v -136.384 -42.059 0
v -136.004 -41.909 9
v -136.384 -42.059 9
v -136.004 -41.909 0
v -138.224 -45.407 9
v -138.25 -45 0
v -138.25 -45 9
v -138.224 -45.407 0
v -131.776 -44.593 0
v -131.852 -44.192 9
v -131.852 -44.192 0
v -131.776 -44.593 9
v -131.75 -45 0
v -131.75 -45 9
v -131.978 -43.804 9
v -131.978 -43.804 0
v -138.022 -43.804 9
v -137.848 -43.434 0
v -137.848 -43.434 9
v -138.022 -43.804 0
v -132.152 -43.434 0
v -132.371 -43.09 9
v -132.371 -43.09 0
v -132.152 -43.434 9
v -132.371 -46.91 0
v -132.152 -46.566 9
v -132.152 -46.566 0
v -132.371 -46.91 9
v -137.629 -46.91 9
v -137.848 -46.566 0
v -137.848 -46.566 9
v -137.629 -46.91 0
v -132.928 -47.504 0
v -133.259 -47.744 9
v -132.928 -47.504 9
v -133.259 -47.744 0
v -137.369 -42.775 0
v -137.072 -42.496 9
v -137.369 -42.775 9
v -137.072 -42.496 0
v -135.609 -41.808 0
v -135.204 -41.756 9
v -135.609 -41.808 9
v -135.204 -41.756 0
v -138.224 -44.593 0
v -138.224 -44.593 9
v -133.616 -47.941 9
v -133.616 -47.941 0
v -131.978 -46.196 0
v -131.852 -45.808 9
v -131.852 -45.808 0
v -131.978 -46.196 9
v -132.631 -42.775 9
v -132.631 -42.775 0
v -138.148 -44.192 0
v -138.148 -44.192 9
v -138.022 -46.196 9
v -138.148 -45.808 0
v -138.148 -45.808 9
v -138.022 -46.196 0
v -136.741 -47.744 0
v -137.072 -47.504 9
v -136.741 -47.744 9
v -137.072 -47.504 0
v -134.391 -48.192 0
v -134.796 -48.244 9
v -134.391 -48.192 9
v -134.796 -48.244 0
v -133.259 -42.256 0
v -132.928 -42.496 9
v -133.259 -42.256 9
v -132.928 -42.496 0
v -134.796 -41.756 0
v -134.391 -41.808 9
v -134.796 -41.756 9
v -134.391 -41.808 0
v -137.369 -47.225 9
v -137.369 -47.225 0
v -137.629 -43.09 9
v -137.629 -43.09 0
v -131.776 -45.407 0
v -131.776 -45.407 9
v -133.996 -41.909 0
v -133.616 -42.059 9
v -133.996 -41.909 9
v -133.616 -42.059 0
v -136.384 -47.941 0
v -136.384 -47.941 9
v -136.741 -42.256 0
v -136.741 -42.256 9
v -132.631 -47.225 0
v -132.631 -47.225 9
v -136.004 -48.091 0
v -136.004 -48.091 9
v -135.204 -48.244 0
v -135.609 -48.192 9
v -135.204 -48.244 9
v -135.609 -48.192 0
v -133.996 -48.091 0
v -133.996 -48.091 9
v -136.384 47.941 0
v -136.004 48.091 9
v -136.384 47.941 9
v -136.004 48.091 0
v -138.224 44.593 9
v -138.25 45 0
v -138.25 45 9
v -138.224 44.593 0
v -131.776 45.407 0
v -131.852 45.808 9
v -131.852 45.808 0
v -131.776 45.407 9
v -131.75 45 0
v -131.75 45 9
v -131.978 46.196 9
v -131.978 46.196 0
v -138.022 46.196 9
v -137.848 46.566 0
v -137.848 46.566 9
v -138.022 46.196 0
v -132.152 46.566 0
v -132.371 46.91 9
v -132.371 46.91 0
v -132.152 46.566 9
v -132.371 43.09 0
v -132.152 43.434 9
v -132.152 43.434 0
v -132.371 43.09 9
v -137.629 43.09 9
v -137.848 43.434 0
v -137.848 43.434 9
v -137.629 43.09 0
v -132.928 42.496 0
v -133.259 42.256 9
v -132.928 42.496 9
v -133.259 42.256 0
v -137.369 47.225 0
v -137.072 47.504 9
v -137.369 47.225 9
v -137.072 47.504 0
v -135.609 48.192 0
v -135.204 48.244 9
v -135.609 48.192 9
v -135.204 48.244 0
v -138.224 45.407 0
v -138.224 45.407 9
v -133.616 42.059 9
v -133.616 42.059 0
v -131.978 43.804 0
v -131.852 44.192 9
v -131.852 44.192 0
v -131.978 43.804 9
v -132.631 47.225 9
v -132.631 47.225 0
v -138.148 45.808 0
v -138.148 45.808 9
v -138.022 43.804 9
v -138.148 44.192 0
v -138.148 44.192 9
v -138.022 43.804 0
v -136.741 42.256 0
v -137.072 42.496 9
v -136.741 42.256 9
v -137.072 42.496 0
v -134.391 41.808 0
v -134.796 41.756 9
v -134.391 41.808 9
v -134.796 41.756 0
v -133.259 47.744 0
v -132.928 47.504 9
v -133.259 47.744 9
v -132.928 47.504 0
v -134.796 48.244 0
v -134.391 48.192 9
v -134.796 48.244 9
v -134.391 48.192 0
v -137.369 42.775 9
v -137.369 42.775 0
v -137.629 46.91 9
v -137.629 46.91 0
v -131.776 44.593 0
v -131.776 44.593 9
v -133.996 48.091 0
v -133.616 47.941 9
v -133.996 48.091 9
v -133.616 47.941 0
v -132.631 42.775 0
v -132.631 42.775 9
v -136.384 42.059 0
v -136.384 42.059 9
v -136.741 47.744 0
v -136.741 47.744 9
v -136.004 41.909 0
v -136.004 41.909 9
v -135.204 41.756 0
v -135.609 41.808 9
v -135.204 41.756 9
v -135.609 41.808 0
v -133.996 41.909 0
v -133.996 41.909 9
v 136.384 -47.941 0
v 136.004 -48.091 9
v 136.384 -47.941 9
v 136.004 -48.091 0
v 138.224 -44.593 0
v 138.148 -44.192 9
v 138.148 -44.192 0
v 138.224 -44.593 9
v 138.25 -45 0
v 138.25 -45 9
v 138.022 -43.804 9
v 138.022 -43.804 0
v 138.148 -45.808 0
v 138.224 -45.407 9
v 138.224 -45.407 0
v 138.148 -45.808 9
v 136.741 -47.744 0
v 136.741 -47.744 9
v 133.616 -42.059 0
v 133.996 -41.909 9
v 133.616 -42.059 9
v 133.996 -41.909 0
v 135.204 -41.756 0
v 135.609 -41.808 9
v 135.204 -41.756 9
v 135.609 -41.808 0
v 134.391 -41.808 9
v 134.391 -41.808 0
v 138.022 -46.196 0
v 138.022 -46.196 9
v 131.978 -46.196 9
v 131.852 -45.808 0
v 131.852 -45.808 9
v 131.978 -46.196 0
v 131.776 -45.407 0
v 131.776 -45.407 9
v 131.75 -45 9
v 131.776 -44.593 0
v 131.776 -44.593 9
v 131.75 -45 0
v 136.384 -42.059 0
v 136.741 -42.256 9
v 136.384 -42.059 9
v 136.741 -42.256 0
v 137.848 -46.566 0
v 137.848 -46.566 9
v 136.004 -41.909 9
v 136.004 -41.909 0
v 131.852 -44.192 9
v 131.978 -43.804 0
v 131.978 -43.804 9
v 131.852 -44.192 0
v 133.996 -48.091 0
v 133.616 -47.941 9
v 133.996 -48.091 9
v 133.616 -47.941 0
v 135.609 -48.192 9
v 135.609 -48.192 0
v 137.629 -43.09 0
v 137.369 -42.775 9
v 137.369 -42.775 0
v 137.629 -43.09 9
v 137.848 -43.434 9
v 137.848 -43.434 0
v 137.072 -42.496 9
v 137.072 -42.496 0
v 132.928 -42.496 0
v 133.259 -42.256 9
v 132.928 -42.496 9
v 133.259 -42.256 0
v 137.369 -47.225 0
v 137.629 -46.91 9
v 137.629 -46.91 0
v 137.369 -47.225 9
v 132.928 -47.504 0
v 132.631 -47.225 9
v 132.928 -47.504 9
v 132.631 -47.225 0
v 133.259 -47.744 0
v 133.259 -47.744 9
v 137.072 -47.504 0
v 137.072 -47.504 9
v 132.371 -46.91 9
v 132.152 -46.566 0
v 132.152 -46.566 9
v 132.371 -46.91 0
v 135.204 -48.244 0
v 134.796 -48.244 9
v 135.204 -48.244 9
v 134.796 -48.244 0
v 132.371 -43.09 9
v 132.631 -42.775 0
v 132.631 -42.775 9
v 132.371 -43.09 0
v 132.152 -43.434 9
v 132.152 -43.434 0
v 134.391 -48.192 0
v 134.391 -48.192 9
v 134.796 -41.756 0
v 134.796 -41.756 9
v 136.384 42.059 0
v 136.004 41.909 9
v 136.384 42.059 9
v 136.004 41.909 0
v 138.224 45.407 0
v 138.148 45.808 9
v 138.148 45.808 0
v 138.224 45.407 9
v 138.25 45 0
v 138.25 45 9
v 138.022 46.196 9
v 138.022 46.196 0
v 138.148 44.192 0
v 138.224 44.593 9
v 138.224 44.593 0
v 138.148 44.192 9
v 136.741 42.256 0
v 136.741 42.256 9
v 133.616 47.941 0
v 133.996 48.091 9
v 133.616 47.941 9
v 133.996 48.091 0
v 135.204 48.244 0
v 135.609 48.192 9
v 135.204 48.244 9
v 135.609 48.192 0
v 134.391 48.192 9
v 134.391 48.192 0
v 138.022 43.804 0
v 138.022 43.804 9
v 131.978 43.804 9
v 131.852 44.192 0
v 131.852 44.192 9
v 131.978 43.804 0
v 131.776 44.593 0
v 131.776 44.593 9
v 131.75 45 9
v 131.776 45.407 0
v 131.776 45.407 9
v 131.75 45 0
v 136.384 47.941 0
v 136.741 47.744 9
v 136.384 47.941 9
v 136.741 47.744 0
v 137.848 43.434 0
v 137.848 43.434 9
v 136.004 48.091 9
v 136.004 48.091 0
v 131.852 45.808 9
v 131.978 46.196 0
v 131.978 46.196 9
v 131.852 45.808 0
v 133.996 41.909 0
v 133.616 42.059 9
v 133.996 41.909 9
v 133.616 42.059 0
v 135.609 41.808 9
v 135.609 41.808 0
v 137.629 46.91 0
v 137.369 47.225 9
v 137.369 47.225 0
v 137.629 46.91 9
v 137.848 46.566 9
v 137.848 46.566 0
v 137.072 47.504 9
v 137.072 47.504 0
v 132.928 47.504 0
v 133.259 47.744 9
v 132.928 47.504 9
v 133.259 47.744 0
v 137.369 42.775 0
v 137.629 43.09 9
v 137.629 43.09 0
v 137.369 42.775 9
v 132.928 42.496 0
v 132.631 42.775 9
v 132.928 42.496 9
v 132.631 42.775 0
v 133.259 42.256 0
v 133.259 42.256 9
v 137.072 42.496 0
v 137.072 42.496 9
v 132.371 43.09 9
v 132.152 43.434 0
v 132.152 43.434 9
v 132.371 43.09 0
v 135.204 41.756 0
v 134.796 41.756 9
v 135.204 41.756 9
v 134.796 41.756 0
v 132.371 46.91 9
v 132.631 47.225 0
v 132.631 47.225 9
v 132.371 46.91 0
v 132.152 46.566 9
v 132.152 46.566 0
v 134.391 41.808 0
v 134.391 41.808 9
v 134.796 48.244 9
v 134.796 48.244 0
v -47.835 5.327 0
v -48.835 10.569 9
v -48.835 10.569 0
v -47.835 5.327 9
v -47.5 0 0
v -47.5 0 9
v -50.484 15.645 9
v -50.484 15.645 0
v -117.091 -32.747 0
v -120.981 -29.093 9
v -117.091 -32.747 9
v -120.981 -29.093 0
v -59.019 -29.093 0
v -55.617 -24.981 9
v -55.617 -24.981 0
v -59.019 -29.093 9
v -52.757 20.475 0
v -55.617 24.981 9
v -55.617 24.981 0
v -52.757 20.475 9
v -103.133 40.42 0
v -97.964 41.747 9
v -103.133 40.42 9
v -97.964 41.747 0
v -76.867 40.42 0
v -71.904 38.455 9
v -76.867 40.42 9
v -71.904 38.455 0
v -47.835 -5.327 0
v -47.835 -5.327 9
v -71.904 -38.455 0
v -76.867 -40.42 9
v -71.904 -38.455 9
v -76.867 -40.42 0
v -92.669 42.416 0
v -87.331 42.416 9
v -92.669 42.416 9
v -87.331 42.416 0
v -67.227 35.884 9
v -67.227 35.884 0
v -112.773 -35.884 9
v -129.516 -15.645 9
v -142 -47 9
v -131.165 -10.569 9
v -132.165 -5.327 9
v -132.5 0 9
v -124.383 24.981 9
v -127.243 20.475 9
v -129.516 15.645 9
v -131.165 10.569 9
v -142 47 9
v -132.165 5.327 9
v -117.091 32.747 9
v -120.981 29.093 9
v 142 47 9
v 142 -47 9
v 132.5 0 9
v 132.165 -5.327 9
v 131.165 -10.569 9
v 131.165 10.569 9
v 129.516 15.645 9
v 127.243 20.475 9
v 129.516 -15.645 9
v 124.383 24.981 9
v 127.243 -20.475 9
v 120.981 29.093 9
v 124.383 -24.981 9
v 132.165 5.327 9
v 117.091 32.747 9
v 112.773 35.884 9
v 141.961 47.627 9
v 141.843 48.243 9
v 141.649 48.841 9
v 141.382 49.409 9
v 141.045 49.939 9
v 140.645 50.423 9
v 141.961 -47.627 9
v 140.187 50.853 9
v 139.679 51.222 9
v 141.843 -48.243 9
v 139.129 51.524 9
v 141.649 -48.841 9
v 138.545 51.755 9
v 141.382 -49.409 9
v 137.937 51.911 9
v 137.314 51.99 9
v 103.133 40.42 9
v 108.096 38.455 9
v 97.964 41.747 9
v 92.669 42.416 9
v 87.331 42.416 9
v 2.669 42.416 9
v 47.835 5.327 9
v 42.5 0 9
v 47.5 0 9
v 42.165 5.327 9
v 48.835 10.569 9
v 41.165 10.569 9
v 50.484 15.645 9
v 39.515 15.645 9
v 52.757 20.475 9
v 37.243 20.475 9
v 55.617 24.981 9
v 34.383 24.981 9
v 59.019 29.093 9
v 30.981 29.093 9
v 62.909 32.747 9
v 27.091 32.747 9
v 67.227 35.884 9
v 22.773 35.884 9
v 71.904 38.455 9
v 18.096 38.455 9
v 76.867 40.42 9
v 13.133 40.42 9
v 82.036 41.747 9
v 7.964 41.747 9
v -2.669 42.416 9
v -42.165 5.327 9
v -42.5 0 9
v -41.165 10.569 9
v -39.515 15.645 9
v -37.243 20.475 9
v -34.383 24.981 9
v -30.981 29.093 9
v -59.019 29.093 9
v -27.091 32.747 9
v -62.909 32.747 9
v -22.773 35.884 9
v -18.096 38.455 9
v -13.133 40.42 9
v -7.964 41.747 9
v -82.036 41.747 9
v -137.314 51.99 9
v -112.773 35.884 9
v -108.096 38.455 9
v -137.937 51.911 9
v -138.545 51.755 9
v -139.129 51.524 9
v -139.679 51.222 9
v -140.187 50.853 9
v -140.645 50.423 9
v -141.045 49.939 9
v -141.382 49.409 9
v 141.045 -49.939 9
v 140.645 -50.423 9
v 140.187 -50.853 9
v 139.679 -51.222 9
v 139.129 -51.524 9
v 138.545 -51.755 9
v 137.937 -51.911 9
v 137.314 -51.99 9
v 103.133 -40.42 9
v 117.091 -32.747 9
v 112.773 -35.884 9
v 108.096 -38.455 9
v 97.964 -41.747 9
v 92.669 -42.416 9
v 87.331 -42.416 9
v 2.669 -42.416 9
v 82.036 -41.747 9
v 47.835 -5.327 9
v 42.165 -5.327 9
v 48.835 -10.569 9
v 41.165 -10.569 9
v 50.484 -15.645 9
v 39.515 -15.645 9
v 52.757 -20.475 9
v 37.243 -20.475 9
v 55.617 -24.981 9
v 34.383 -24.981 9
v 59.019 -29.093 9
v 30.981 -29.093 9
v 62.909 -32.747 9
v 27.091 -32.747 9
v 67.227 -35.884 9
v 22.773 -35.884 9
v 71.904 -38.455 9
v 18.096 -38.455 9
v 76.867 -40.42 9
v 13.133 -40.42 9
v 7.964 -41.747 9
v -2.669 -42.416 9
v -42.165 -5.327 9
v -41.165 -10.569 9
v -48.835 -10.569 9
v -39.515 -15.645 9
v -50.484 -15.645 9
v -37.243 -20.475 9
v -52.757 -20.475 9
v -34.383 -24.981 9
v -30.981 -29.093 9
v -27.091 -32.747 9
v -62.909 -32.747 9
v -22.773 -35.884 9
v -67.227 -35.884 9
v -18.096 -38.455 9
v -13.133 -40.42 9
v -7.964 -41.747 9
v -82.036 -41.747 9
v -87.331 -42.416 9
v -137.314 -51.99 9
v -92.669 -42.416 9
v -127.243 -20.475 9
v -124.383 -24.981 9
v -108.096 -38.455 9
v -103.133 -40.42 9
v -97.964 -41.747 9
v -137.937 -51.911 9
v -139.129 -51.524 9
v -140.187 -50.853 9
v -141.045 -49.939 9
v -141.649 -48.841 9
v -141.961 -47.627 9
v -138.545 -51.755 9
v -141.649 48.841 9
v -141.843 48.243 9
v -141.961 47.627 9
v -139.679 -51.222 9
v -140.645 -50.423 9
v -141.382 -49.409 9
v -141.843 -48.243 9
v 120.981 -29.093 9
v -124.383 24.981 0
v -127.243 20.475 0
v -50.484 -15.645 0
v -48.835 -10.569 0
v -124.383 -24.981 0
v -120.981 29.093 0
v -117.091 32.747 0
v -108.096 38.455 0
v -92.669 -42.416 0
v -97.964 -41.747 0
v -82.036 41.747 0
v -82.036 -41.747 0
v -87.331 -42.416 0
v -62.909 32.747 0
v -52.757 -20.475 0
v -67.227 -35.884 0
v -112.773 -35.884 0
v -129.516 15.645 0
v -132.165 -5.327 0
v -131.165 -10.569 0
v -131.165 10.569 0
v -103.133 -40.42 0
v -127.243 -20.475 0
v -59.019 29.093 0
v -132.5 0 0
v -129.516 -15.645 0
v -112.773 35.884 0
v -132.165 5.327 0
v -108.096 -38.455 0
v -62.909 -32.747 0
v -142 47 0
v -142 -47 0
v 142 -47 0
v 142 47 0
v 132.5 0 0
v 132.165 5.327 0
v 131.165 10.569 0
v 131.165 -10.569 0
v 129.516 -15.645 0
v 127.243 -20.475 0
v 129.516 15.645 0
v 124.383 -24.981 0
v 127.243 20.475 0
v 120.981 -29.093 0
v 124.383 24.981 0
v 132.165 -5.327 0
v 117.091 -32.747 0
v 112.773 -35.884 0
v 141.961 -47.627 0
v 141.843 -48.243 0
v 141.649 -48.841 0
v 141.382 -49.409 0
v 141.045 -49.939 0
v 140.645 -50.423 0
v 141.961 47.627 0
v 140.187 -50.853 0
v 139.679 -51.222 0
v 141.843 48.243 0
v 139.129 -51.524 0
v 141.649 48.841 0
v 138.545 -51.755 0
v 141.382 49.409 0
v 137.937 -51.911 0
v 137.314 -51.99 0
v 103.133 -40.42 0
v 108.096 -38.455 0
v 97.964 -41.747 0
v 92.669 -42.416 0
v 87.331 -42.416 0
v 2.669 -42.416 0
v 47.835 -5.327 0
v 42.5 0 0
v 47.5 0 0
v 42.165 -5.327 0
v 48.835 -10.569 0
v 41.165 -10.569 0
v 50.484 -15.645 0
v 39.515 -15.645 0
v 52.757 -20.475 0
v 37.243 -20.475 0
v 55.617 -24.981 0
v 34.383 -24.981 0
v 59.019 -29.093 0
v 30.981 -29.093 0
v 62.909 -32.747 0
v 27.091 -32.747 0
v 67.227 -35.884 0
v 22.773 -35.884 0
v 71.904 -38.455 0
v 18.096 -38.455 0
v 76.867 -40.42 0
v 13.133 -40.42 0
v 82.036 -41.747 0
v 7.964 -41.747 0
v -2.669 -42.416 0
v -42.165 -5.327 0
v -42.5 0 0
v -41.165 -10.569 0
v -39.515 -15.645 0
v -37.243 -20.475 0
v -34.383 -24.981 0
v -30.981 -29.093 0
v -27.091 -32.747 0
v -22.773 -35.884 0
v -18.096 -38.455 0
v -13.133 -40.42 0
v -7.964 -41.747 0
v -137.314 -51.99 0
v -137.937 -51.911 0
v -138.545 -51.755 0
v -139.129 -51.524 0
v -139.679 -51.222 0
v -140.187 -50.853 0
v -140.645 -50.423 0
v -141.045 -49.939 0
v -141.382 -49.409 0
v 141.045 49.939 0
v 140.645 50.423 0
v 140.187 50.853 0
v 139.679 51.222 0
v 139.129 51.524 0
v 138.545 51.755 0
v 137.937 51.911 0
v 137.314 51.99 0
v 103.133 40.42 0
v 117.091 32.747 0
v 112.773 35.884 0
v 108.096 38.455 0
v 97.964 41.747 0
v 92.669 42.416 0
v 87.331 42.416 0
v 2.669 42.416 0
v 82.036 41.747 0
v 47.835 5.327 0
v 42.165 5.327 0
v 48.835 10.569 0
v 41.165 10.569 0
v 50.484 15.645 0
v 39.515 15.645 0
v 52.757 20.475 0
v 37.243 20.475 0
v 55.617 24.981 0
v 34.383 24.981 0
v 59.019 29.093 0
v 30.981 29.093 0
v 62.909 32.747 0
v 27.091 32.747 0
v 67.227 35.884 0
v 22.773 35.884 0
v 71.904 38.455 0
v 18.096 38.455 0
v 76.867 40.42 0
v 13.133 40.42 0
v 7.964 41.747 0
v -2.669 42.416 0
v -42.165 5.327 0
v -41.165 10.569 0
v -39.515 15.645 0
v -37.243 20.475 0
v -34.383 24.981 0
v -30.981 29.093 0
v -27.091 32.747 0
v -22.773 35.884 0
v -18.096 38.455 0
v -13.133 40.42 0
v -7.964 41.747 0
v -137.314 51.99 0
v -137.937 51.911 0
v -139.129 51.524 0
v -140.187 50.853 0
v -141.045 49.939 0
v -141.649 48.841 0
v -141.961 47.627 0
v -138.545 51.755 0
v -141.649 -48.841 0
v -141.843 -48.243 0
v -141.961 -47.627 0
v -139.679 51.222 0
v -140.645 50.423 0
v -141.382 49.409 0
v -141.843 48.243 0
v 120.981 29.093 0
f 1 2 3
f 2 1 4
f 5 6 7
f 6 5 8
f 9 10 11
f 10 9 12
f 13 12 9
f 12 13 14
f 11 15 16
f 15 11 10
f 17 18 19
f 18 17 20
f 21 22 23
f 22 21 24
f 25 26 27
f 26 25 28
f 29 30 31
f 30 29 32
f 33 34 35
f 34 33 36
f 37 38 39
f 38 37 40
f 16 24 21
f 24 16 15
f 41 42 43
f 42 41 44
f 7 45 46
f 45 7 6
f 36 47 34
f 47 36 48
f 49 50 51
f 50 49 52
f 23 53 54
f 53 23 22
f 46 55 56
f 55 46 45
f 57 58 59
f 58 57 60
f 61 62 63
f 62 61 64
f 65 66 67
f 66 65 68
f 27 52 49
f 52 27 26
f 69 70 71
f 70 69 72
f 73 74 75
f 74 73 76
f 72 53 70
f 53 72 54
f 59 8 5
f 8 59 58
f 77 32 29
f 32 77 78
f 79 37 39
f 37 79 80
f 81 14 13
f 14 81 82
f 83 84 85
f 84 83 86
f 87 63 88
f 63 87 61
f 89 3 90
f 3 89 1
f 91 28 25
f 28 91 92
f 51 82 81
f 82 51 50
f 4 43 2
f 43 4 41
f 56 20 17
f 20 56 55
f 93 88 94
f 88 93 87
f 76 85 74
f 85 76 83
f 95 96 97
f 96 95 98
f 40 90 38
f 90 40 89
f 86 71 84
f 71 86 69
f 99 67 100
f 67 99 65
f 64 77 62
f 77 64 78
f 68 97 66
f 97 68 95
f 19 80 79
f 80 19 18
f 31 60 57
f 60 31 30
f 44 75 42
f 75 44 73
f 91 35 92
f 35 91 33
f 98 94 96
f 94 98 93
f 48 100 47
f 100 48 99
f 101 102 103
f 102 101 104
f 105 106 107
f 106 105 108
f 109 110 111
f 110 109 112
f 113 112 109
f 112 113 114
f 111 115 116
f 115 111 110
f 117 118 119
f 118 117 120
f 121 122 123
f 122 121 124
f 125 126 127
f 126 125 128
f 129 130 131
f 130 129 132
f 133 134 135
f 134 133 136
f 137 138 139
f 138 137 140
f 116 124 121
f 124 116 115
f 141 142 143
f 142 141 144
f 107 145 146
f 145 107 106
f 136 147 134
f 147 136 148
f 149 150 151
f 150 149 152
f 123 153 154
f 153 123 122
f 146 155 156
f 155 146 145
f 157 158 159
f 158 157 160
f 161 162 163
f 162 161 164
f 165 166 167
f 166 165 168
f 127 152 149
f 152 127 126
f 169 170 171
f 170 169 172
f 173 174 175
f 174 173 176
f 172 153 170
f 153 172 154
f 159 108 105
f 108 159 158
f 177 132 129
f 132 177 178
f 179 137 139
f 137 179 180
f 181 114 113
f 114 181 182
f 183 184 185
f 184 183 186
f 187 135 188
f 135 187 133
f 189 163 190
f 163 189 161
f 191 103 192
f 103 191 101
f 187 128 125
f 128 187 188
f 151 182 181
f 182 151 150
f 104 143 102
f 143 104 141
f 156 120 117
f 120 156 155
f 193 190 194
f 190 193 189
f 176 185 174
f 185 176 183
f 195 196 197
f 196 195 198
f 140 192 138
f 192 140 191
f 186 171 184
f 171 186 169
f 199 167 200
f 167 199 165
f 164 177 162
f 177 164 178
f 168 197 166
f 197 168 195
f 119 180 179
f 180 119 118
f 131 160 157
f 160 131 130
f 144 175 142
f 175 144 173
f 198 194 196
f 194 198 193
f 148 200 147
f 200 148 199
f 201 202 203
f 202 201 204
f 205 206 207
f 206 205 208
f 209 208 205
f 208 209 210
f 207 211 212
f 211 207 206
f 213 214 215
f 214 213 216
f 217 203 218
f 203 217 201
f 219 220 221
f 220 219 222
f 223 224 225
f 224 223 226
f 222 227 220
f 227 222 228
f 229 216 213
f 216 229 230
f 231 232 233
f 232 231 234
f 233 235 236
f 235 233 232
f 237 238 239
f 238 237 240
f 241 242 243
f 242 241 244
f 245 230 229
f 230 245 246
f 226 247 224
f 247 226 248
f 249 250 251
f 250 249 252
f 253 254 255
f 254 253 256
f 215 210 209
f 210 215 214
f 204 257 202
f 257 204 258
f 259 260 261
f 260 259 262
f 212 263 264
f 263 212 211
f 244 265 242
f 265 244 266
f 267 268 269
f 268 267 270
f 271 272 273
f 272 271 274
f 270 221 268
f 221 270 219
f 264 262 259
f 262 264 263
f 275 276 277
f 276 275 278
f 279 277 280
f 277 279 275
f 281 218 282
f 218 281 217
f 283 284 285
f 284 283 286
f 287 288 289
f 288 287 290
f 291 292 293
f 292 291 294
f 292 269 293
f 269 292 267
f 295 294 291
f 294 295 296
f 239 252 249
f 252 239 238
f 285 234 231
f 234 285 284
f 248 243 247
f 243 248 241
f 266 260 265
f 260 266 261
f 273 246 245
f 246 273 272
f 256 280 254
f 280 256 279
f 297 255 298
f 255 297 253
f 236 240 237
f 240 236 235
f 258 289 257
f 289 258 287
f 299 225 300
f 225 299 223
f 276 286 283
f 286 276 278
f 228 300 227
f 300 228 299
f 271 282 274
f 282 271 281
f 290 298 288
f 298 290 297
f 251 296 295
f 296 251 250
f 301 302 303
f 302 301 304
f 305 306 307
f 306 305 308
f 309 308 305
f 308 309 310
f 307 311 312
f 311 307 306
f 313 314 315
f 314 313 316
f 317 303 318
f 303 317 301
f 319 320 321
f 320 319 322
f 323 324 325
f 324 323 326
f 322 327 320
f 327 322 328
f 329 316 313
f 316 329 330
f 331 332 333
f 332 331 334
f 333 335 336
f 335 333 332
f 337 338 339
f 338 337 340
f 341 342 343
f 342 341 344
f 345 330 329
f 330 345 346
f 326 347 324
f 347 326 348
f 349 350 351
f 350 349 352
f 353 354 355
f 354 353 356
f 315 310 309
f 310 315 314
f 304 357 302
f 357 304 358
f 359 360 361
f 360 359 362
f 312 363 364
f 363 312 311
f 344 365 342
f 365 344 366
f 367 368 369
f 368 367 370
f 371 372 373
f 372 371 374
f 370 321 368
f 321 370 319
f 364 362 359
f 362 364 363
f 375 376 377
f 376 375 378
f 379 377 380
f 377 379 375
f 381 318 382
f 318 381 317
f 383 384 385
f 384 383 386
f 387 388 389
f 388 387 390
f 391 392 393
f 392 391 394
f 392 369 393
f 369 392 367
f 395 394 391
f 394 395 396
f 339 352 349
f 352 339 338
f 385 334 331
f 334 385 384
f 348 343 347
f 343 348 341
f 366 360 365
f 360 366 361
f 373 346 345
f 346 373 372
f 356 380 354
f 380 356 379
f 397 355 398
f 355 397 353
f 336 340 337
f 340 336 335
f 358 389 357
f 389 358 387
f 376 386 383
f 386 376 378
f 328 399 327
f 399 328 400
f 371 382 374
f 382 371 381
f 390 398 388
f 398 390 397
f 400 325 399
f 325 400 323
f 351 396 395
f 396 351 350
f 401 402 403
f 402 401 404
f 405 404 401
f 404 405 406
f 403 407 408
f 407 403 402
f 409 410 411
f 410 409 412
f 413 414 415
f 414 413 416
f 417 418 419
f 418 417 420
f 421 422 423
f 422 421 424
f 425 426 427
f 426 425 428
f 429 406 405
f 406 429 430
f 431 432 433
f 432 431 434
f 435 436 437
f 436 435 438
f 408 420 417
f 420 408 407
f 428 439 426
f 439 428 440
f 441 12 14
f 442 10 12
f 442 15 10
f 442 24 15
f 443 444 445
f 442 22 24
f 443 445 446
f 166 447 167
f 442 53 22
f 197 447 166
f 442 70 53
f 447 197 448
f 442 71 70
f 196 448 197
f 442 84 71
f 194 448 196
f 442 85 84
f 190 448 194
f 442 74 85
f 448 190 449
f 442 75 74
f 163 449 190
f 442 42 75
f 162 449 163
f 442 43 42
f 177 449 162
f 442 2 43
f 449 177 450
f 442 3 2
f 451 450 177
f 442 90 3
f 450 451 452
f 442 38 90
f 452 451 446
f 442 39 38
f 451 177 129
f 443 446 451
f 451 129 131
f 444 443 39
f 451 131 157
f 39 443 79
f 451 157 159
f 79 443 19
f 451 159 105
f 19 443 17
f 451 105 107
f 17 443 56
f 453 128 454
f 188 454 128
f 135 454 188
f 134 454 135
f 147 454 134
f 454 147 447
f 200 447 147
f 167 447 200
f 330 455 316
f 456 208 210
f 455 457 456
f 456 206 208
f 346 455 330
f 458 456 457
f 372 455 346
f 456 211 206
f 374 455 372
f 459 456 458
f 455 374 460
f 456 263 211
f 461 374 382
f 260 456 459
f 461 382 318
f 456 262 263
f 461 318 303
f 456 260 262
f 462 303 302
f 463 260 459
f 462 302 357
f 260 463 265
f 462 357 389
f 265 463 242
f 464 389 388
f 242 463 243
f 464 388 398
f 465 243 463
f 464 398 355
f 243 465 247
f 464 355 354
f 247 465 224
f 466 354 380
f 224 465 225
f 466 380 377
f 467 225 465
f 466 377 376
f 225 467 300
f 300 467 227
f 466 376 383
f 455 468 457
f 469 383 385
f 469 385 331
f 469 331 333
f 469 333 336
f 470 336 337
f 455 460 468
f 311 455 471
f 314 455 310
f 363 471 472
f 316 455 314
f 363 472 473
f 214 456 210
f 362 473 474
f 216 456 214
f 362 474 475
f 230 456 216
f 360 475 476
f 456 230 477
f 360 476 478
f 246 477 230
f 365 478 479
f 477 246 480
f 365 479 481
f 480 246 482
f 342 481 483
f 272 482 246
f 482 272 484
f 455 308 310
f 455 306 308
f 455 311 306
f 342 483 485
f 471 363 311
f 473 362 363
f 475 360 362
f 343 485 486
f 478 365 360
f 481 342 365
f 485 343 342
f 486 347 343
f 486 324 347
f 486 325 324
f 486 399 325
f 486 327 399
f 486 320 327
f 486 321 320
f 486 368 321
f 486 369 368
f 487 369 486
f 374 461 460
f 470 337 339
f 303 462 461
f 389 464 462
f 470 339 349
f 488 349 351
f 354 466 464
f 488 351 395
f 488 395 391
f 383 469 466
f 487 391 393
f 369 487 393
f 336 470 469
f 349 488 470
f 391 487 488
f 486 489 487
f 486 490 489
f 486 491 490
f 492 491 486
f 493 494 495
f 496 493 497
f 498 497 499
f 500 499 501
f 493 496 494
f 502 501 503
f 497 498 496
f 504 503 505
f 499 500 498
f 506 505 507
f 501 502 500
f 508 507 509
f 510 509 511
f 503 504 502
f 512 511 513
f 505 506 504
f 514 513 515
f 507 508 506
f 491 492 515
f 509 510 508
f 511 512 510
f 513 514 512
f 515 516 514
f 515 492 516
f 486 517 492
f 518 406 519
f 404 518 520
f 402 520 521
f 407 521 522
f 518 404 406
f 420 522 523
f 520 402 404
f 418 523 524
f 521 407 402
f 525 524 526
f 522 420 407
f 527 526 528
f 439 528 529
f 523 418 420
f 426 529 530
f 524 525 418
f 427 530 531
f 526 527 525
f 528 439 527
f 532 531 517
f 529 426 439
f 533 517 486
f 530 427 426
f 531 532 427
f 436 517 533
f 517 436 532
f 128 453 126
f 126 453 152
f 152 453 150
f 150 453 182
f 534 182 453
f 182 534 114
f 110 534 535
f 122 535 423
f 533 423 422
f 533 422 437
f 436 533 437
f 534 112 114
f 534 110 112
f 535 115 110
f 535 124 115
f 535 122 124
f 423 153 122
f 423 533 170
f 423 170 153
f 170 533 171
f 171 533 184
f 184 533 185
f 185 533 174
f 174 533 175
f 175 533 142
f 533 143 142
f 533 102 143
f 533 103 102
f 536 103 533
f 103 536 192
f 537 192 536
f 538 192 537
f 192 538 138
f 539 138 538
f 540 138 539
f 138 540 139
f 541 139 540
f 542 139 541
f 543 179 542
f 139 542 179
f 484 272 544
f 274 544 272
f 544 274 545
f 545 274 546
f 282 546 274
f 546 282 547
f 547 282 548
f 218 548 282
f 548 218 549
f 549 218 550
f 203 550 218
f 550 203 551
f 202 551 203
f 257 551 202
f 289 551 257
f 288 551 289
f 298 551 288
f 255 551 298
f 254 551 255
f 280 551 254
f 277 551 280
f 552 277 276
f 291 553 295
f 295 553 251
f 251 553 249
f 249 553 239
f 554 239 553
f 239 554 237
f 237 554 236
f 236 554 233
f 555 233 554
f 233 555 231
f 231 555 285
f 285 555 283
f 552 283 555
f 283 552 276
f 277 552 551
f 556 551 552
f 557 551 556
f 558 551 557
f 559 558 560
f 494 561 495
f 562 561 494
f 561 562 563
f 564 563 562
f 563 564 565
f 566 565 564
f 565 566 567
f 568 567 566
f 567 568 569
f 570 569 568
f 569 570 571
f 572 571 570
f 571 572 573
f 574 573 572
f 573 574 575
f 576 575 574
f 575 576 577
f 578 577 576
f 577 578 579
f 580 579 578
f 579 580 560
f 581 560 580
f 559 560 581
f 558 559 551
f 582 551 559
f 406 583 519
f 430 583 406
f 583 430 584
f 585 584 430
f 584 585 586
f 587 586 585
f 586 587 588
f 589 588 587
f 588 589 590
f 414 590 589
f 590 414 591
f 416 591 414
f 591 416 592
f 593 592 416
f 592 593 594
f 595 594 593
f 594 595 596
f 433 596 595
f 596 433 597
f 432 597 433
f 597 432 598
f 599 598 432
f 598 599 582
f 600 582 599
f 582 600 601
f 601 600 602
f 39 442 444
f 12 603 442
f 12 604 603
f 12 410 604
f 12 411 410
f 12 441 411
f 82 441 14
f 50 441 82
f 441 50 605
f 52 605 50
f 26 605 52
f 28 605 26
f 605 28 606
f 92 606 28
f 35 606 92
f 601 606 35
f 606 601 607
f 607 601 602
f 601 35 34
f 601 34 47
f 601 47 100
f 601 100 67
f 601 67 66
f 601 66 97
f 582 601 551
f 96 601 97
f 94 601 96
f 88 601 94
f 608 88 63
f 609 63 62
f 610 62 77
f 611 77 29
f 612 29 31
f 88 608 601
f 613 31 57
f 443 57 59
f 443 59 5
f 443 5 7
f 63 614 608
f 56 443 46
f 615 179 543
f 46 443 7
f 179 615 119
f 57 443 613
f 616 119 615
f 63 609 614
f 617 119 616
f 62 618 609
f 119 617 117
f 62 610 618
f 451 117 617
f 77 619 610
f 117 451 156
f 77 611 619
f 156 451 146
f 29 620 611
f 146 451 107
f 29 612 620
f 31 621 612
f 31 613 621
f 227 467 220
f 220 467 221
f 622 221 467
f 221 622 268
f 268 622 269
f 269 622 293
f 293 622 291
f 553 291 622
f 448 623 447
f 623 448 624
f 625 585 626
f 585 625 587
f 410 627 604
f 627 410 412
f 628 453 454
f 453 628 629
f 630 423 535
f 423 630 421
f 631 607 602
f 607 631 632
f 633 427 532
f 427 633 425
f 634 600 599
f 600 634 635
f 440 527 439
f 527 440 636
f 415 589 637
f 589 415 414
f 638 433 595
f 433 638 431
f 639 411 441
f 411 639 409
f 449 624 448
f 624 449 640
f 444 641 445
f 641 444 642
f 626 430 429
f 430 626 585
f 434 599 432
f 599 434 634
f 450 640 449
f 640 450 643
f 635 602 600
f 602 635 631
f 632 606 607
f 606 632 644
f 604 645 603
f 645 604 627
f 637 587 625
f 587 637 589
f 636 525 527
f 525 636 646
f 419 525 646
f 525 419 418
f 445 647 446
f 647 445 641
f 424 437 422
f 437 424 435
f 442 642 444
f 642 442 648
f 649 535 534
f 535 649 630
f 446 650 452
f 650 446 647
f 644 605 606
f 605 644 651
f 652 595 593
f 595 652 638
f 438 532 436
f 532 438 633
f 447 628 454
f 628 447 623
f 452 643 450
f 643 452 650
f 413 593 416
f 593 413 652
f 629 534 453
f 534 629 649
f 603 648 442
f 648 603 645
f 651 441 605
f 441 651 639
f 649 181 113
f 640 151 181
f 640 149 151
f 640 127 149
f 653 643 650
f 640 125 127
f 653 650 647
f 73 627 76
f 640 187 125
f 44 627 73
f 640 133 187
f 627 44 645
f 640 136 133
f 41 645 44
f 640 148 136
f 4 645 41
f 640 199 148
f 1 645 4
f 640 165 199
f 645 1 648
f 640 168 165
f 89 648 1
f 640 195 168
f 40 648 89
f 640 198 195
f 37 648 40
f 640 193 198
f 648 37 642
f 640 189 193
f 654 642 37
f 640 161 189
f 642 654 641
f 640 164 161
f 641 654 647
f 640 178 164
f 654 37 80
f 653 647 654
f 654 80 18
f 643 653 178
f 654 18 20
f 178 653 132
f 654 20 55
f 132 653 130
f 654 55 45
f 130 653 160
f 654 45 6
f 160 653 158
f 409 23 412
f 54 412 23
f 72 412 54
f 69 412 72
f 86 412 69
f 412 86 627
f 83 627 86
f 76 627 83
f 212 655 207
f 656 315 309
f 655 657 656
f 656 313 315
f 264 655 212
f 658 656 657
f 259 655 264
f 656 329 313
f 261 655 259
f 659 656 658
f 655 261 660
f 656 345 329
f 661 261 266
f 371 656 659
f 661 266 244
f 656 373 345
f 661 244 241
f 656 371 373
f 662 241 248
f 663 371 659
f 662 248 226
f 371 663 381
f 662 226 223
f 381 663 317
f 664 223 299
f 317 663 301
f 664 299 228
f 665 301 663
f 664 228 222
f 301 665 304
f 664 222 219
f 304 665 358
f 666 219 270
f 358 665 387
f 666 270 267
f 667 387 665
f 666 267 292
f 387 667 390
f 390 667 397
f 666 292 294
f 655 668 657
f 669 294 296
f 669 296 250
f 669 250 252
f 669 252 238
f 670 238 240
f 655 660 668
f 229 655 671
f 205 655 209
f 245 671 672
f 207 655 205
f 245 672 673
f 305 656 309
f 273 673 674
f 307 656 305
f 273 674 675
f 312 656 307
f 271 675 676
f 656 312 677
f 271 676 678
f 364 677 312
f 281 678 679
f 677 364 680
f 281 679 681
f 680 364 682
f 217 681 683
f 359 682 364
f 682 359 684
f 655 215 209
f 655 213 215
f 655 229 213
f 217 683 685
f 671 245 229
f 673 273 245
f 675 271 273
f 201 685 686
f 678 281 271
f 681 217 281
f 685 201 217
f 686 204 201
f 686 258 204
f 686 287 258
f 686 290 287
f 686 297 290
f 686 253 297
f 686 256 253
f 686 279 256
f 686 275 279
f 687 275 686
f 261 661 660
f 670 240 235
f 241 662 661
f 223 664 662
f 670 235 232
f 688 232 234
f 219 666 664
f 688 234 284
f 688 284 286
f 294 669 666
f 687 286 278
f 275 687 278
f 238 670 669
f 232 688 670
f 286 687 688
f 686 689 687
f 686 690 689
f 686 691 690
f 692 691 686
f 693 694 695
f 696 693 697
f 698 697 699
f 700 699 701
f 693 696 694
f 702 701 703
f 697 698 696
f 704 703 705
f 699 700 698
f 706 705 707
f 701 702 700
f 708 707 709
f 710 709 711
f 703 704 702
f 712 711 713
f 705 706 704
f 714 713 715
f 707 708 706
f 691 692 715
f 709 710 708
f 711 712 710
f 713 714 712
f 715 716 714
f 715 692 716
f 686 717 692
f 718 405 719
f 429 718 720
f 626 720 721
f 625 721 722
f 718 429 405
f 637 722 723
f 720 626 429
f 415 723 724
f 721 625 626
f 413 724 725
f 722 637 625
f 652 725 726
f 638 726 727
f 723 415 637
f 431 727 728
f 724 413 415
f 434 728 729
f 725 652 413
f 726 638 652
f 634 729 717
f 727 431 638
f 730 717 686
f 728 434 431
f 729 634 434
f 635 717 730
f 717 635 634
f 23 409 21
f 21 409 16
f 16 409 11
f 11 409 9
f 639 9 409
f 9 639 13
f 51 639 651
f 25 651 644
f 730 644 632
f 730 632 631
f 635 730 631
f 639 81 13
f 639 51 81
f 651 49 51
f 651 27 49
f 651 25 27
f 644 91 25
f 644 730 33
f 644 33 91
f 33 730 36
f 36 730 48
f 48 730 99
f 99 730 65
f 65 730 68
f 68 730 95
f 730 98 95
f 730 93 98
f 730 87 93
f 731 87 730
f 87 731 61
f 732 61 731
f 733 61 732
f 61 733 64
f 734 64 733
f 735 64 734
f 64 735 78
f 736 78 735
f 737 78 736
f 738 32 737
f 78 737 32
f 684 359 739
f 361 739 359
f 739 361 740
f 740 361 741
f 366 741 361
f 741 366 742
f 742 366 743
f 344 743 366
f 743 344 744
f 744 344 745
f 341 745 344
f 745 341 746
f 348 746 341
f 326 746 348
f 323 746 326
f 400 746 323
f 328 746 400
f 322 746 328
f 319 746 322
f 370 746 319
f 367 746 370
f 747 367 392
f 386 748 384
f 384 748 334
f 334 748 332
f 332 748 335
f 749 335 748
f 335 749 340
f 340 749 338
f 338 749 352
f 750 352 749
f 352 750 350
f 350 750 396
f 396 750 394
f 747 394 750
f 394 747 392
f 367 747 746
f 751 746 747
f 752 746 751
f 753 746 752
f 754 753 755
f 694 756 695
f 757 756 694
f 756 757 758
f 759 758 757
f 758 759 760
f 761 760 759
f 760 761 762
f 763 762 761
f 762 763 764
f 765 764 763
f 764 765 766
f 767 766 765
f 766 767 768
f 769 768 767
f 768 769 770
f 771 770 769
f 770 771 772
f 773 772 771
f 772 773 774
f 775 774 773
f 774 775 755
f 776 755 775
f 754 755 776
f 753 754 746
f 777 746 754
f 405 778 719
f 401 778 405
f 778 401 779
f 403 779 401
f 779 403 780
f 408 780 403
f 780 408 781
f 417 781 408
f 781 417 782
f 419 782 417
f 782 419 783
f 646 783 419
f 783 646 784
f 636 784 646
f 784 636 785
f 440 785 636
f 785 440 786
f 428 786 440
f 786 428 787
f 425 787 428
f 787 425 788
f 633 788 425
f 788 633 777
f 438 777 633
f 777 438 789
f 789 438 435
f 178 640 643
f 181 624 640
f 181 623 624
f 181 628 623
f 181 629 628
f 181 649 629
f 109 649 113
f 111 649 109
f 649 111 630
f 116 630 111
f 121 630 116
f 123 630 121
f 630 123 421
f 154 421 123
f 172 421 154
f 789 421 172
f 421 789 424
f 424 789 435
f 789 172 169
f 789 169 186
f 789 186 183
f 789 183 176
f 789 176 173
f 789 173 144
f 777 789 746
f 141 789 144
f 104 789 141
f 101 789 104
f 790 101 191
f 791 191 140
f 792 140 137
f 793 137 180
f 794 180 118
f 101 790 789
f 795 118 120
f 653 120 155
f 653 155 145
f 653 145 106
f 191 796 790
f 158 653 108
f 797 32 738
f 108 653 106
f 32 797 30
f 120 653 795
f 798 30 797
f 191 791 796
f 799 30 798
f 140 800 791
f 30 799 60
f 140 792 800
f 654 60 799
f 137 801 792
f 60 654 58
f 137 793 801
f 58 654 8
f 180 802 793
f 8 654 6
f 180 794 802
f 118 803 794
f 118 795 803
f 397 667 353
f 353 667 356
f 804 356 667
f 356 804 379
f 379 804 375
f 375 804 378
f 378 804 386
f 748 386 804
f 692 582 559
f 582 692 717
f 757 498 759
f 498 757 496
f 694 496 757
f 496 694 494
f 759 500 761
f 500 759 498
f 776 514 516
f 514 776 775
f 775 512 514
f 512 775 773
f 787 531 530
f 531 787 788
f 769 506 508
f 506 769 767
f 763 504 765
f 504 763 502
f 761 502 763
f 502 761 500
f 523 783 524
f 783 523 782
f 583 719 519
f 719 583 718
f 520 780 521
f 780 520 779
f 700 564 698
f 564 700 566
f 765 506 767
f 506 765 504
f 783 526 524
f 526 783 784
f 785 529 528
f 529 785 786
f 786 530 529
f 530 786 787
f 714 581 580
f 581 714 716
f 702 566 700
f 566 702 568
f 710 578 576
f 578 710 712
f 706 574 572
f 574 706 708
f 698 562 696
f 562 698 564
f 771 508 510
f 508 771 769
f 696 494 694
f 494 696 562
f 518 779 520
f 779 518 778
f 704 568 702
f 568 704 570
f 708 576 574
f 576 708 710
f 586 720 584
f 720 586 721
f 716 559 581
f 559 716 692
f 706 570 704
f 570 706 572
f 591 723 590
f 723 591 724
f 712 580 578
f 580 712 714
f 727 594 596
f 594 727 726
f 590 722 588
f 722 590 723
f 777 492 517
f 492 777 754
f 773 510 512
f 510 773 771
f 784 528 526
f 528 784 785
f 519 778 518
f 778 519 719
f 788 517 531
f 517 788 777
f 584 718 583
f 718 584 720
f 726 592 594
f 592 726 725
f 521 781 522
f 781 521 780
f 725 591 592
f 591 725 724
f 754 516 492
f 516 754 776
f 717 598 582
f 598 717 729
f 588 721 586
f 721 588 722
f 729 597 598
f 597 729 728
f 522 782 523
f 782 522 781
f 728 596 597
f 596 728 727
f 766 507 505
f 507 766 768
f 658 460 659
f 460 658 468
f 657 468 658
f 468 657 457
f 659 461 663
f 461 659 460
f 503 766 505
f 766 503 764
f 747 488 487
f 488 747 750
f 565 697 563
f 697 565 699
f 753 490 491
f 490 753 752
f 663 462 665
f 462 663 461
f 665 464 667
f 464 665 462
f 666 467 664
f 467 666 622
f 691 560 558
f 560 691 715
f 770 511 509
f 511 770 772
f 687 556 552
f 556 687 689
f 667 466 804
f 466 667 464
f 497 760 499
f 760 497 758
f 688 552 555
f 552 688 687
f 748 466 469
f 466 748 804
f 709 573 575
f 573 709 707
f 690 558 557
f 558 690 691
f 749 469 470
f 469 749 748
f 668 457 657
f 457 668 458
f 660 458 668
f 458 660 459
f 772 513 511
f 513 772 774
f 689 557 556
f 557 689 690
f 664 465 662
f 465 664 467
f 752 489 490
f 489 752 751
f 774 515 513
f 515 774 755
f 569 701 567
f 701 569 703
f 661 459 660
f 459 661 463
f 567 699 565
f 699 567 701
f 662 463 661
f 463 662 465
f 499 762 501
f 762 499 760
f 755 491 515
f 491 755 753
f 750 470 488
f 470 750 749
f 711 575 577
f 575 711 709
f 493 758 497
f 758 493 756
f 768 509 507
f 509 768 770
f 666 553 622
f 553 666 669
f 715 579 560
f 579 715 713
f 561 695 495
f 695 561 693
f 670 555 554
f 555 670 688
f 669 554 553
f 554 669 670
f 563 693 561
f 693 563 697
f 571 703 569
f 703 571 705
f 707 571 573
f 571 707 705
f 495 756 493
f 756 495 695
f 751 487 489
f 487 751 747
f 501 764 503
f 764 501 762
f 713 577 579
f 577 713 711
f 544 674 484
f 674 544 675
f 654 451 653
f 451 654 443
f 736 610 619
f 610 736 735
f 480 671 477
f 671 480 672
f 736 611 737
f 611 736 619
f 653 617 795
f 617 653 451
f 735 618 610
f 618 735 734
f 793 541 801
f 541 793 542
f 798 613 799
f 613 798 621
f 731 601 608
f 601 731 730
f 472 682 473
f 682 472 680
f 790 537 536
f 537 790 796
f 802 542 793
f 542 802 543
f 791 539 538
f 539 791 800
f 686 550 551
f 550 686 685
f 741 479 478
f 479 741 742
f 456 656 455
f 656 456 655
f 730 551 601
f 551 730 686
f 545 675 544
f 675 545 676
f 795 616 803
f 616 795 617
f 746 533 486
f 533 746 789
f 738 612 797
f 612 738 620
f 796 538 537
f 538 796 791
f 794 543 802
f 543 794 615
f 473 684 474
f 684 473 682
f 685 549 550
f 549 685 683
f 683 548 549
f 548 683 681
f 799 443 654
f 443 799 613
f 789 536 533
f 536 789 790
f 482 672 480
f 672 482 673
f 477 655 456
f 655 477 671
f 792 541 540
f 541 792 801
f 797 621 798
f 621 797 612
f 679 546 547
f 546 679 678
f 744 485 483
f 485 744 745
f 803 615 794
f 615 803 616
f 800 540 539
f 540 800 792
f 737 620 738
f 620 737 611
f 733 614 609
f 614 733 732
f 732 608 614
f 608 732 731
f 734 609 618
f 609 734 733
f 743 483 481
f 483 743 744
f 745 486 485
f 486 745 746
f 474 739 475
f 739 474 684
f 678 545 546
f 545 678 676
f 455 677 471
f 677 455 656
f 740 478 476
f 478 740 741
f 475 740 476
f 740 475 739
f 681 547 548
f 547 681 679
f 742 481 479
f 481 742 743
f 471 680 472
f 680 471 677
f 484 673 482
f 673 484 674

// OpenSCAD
$fn = 50;


difference() {
	union() {
		hull() {
			translate(v = [-137.0000000000, 47.0000000000, 0]) {
				cylinder(h = 9, r = 5);
			}
			translate(v = [137.0000000000, 47.0000000000, 0]) {
				cylinder(h = 9, r = 5);
			}
			translate(v = [-137.0000000000, -47.0000000000, 0]) {
				cylinder(h = 9, r = 5);
			}
			translate(v = [137.0000000000, -47.0000000000, 0]) {
				cylinder(h = 9, r = 5);
			}
		}
	}
	union() {
		#translate(v = [-135.0000000000, -45.0000000000, -100.0000000000]) {
			cylinder(h = 200, r = 3.2500000000);
		}
		#translate(v = [-135.0000000000, 45.0000000000, -100.0000000000]) {
			cylinder(h = 200, r = 3.2500000000);
		}
		#translate(v = [135.0000000000, -45.0000000000, -100.0000000000]) {
			cylinder(h = 200, r = 3.2500000000);
		}
		#translate(v = [135.0000000000, 45.0000000000, -100.0000000000]) {
			cylinder(h = 200, r = 3.2500000000);
		}
		#translate(v = [-90.0000000000, 0, 0]) {
			cylinder(h = 9, r = 42.5000000000);
		}
		#cylinder(h = 9, r = 42.5000000000);
		#translate(v = [90.0000000000, 0, 0]) {
			cylinder(h = 9, r = 42.5000000000);
		}
	}
}
